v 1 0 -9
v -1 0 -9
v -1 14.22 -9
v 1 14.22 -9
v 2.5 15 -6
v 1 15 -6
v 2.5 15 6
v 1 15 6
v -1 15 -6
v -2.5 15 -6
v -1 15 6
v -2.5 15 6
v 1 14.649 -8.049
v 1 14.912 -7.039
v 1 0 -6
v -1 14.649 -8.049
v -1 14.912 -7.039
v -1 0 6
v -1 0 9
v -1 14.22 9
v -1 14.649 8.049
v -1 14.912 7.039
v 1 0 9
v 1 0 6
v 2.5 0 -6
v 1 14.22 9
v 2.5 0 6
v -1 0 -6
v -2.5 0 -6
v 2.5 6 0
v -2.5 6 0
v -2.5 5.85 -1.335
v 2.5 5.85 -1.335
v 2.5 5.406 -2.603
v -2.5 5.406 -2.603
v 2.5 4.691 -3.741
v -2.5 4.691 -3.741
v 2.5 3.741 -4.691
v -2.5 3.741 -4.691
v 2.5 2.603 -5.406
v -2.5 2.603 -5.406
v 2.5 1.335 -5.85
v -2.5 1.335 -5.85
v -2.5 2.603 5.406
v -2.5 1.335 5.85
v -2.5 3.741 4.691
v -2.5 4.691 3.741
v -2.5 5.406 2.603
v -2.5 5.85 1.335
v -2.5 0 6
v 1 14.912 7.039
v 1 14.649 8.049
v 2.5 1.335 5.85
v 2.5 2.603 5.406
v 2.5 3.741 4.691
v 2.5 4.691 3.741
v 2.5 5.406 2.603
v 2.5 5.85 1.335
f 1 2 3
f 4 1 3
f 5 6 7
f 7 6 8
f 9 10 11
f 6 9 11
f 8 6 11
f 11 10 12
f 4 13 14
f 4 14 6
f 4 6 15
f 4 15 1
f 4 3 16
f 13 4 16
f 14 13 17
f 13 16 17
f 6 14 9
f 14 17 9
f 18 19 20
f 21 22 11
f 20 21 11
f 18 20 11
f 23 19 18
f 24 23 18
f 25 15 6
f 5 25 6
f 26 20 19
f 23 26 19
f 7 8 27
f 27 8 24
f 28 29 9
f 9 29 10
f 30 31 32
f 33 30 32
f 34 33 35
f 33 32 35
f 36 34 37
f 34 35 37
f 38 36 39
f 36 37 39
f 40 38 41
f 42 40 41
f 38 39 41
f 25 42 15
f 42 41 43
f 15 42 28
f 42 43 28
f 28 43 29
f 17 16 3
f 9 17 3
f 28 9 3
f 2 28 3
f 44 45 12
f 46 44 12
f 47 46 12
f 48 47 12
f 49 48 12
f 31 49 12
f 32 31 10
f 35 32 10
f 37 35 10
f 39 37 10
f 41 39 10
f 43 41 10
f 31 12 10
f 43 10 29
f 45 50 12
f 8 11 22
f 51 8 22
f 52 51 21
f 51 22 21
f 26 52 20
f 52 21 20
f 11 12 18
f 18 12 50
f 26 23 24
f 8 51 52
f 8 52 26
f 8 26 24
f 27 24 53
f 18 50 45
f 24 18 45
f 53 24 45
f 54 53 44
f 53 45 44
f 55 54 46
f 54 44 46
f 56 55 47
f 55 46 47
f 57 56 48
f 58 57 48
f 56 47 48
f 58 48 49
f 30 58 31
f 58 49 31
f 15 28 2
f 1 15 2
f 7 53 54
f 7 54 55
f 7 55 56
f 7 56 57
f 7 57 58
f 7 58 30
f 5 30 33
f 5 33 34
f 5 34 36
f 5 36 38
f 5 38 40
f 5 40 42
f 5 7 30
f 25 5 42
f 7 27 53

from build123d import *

# Parameters (mm, degrees)
BOSS_EXTRUDE1_DEPTH      = 2.5
BOSS_EXTRUDE1_DEPTH_BACK = 2.5
BOSS_EXTRUDE2_DEPTH      = 1
BOSS_EXTRUDE2_DEPTH_BACK = 1


with BuildPart() as part:
    # Sketch1 → Boss-Extrude1 (new, two sides: drawn at the far end of the back side and taken through both)
    with BuildSketch(Plane(origin=(0, 0, 0), x_dir=(0, 0, -1), z_dir=(1, 0, 0)).offset(-BOSS_EXTRUDE1_DEPTH_BACK)):
        with BuildLine():
            ThreePointArc((-6, 0), (0, 6), (6, 0))
            Line((6, 0), (6, 15))
            Line((6, 15), (-6, 15))
            Line((-6, 15), (-6, 0))
        make_face()
    extrude(amount=BOSS_EXTRUDE1_DEPTH + BOSS_EXTRUDE1_DEPTH_BACK)

    # Sketch1<3> → Boss-Extrude2 (add, two sides: drawn at the far end of the back side and taken through both)
    with BuildSketch(Plane(origin=(0, 0, 0), x_dir=(0, 0, -1), z_dir=(1, 0, 0)).offset(-BOSS_EXTRUDE2_DEPTH_BACK)):
        with BuildLine():
            Line((-6, 0), (-6, 15))
            ThreePointArc((-6, 15), (-7.549870962, 14.801811394), (-9, 14.22))
            Line((-9, 14.22), (-9, 0))
            Line((-9, 0), (-6, 0))
        make_face()
        with BuildLine():
            ThreePointArc((9, 14.22), (7.549870962, 14.801811394), (6, 15))
            Line((6, 15), (6, 0))
            Line((6, 0), (9, 0))
            Line((9, 0), (9, 14.22))
        make_face()
    extrude(amount=BOSS_EXTRUDE2_DEPTH + BOSS_EXTRUDE2_DEPTH_BACK)


solid = part.part
